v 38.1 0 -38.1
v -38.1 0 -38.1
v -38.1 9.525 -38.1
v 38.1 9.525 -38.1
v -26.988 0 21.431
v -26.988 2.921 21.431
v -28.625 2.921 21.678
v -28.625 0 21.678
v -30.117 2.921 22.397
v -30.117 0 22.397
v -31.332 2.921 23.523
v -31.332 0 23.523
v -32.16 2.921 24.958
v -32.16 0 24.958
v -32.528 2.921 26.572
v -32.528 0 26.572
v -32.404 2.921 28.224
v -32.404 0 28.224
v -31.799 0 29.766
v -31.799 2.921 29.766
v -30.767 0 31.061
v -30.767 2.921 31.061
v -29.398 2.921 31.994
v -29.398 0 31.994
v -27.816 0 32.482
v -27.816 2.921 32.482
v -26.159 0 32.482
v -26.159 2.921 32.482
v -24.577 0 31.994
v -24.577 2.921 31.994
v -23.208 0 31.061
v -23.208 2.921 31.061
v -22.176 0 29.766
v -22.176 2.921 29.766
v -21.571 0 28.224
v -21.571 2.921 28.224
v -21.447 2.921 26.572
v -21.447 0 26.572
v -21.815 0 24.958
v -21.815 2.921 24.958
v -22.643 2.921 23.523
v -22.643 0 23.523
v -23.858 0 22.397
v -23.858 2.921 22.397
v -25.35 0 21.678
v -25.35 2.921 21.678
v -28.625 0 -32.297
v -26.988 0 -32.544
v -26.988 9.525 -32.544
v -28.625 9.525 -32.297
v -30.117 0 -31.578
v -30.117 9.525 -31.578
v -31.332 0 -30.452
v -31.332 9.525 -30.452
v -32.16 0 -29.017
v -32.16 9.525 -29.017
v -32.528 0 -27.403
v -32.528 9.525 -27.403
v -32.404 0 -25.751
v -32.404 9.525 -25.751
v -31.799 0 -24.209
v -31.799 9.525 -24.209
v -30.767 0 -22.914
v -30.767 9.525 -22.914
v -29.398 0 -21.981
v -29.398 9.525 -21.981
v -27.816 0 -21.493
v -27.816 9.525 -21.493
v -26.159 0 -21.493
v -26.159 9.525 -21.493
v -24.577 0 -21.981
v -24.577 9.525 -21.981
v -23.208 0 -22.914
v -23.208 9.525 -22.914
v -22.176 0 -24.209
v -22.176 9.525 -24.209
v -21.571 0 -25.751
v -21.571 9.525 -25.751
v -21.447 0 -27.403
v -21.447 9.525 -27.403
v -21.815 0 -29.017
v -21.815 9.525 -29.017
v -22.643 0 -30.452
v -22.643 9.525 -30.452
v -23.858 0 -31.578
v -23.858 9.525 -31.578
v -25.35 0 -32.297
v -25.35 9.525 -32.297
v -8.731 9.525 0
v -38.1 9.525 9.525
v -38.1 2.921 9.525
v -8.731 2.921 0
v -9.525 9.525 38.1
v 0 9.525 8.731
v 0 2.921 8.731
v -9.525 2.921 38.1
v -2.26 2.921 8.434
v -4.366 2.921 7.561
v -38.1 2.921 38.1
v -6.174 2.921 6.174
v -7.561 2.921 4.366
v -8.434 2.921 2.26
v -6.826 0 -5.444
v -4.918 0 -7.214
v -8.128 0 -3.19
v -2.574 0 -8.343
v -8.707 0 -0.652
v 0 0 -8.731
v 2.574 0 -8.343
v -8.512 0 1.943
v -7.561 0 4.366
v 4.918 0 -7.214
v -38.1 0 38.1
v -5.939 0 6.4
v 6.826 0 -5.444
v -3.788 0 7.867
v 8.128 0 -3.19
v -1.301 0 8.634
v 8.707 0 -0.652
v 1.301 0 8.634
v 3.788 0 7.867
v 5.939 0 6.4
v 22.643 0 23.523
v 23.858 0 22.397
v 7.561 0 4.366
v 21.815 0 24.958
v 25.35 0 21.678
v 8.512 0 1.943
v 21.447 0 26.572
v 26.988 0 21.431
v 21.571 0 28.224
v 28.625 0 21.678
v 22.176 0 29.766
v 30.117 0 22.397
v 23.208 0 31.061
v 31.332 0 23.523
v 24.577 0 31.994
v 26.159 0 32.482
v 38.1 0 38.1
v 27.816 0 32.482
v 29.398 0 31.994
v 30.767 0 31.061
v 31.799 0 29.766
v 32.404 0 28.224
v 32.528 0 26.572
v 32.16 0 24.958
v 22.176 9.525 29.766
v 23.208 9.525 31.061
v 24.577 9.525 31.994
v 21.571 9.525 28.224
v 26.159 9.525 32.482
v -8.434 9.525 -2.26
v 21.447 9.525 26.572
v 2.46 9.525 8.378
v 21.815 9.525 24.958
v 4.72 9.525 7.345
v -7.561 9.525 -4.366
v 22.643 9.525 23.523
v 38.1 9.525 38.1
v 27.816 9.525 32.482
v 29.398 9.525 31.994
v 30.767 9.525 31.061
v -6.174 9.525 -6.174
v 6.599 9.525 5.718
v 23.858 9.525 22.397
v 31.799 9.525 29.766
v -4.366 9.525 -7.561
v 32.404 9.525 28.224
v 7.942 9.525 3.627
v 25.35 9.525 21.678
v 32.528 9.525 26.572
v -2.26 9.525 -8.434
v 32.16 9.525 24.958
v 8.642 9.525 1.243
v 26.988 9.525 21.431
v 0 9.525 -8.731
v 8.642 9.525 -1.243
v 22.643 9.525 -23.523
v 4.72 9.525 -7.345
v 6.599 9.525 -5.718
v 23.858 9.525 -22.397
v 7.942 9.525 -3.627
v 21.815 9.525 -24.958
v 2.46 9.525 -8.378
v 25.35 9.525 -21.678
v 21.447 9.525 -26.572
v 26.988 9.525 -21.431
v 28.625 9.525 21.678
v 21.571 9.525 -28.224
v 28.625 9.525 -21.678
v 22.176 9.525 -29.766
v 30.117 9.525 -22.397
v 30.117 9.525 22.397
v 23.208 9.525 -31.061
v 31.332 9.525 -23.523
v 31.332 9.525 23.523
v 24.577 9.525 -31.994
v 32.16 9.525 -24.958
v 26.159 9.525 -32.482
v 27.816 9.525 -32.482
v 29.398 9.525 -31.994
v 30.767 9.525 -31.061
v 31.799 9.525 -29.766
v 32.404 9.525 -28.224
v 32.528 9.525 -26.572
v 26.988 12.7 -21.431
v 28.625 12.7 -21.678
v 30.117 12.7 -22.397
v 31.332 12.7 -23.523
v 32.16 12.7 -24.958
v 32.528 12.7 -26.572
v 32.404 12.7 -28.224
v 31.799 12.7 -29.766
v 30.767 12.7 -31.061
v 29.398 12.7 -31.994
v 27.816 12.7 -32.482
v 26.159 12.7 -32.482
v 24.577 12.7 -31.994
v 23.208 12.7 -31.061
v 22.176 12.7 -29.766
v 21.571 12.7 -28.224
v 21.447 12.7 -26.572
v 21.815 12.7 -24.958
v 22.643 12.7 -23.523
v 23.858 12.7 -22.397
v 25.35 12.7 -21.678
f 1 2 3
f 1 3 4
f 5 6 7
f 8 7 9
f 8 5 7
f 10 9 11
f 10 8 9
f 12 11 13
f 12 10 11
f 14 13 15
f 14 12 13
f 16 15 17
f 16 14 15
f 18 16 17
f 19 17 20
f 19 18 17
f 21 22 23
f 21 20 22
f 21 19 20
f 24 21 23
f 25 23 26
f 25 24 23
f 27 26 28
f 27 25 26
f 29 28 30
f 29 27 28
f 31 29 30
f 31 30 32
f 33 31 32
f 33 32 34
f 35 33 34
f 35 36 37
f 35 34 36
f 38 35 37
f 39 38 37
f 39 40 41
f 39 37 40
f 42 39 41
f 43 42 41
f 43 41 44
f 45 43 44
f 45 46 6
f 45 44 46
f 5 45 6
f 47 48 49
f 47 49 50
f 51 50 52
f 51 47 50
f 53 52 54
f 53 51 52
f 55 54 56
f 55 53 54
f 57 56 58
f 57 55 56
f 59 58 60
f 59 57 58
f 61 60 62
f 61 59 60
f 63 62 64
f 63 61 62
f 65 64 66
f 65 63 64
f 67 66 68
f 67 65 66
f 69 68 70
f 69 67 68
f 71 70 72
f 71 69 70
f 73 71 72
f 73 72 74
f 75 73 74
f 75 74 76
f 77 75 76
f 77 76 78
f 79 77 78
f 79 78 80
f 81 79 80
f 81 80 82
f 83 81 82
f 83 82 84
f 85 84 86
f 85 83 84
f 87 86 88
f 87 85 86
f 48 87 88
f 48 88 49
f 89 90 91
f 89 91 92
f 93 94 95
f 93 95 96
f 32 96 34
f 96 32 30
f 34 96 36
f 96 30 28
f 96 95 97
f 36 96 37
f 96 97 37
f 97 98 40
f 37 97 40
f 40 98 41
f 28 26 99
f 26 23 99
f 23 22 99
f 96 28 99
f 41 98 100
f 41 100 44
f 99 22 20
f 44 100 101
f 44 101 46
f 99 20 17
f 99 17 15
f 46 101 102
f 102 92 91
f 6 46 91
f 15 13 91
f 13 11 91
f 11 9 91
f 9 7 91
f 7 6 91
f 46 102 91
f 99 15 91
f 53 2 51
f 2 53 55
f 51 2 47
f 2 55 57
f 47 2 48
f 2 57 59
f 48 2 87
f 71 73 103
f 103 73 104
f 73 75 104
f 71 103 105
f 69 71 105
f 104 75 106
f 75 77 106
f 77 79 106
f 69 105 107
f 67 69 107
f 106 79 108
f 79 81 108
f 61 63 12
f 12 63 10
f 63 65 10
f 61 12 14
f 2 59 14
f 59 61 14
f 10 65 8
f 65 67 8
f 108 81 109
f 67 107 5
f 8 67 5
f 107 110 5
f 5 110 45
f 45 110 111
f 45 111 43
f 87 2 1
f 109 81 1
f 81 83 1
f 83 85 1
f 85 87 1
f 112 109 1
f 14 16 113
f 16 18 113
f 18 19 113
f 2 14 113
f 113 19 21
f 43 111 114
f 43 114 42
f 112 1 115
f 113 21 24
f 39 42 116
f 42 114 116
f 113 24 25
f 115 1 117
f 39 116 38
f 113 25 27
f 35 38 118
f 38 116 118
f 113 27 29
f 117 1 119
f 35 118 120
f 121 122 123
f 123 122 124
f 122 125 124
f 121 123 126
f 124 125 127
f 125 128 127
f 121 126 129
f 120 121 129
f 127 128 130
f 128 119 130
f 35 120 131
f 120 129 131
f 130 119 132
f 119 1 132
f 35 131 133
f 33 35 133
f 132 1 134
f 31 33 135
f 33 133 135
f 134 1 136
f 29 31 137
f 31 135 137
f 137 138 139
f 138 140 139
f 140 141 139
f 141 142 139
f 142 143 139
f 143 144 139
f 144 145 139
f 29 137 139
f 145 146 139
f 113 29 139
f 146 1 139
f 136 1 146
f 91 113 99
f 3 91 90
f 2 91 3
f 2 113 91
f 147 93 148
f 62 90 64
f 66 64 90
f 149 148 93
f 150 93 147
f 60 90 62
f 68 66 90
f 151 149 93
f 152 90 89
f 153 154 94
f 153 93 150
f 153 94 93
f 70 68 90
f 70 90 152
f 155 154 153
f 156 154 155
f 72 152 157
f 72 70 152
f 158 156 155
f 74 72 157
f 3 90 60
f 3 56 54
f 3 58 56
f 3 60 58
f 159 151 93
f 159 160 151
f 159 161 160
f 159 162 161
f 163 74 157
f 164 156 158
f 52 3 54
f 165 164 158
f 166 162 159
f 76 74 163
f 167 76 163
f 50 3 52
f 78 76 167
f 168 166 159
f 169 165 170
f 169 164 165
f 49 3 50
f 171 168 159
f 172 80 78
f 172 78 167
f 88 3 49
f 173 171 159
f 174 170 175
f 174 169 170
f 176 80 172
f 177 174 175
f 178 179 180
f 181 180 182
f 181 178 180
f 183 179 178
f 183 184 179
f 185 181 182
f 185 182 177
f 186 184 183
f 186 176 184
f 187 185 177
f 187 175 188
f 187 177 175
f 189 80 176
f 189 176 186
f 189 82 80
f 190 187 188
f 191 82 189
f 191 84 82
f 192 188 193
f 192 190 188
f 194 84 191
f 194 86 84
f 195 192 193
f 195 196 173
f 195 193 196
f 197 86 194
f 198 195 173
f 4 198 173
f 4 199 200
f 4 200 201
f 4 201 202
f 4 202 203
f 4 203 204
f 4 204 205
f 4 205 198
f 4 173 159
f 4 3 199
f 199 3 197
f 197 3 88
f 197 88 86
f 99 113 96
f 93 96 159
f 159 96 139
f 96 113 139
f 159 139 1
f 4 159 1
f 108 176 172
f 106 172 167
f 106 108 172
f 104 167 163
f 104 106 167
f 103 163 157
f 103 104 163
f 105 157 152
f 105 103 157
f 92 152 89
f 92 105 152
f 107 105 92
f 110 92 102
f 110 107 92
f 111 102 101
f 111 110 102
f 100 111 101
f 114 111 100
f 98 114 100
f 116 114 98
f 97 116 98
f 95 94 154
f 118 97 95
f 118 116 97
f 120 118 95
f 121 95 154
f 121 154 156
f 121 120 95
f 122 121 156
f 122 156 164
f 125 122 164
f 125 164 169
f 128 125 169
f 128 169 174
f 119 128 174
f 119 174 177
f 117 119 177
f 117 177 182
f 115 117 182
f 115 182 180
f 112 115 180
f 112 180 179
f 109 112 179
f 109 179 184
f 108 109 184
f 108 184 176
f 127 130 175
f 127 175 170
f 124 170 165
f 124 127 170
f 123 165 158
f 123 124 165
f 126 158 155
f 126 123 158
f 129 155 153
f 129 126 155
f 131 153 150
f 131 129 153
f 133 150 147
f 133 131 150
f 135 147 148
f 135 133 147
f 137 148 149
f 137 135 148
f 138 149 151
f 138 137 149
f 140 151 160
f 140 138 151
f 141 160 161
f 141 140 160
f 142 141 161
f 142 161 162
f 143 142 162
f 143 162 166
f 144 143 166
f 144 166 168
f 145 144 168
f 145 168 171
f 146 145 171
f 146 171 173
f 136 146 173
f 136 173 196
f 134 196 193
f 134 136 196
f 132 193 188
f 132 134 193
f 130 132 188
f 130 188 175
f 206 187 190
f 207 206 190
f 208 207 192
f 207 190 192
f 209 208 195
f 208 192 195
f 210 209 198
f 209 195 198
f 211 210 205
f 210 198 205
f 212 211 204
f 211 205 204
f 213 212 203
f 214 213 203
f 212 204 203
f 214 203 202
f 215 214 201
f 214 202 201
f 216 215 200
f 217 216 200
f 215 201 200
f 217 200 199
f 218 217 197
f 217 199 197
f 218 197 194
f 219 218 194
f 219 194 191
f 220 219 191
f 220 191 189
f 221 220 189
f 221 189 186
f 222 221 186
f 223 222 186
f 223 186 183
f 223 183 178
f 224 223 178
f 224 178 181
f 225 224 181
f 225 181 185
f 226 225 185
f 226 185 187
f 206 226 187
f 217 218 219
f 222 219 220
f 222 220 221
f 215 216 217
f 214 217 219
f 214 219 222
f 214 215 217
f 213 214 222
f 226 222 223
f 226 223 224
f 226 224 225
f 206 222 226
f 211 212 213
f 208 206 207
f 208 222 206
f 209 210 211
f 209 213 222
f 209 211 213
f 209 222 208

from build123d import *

# Parameters (mm, degrees)
SKETCH1_W           = 76.2
SKETCH1_H           = 76.2
SKETCH1_R           = 5.55625
SKETCH1_R_2         = 8.73125
BOSS_EXTRUDE1_DEPTH = 9.525
CUT_EXTRUDE1_DEPTH  = 6.604
SKETCH1_3_R         = 5.55625
BOSS_EXTRUDE2_DEPTH = 12.7


with BuildPart() as part:
    # Sketch1 → Boss-Extrude1 (new body)
    with BuildSketch(Plane(origin=(0, 0, 0), x_dir=(1, 0, 0), z_dir=(0, 1, 0))):
        Rectangle(SKETCH1_W, SKETCH1_H)
        with Locations((-26.9875, -26.9875)):
            Circle(SKETCH1_R, mode=Mode.SUBTRACT)
        with Locations((26.9875, -26.9875)):
            Circle(SKETCH1_R, mode=Mode.SUBTRACT)
        Circle(SKETCH1_R_2, mode=Mode.SUBTRACT)
        with Locations((-26.9875, 26.9875)):
            Circle(SKETCH1_R, mode=Mode.SUBTRACT)
    extrude(amount=BOSS_EXTRUDE1_DEPTH)

    # Sketch2 → Cut-Extrude1 (cut)
    with BuildSketch(Plane(origin=(0, 9.525, 0), x_dir=(1, 0, 0), z_dir=(0, 1, 0))):
        Polygon((-38.1, -9.525), (-8.73125, 0), (0, -8.73125), (-9.525, -38.1), (-38.1, -38.1), align=None)
    extrude(amount=-CUT_EXTRUDE1_DEPTH, mode=Mode.SUBTRACT)

    # Sketch1<3> → Boss-Extrude2 (add)
    with BuildSketch(Plane(origin=(0, 0, 0), x_dir=(1, 0, 0), z_dir=(0, 1, 0))):
        with Locations((26.9875, 26.9875)):
            Circle(SKETCH1_3_R)
    extrude(amount=BOSS_EXTRUDE2_DEPTH)


solid = part.part
